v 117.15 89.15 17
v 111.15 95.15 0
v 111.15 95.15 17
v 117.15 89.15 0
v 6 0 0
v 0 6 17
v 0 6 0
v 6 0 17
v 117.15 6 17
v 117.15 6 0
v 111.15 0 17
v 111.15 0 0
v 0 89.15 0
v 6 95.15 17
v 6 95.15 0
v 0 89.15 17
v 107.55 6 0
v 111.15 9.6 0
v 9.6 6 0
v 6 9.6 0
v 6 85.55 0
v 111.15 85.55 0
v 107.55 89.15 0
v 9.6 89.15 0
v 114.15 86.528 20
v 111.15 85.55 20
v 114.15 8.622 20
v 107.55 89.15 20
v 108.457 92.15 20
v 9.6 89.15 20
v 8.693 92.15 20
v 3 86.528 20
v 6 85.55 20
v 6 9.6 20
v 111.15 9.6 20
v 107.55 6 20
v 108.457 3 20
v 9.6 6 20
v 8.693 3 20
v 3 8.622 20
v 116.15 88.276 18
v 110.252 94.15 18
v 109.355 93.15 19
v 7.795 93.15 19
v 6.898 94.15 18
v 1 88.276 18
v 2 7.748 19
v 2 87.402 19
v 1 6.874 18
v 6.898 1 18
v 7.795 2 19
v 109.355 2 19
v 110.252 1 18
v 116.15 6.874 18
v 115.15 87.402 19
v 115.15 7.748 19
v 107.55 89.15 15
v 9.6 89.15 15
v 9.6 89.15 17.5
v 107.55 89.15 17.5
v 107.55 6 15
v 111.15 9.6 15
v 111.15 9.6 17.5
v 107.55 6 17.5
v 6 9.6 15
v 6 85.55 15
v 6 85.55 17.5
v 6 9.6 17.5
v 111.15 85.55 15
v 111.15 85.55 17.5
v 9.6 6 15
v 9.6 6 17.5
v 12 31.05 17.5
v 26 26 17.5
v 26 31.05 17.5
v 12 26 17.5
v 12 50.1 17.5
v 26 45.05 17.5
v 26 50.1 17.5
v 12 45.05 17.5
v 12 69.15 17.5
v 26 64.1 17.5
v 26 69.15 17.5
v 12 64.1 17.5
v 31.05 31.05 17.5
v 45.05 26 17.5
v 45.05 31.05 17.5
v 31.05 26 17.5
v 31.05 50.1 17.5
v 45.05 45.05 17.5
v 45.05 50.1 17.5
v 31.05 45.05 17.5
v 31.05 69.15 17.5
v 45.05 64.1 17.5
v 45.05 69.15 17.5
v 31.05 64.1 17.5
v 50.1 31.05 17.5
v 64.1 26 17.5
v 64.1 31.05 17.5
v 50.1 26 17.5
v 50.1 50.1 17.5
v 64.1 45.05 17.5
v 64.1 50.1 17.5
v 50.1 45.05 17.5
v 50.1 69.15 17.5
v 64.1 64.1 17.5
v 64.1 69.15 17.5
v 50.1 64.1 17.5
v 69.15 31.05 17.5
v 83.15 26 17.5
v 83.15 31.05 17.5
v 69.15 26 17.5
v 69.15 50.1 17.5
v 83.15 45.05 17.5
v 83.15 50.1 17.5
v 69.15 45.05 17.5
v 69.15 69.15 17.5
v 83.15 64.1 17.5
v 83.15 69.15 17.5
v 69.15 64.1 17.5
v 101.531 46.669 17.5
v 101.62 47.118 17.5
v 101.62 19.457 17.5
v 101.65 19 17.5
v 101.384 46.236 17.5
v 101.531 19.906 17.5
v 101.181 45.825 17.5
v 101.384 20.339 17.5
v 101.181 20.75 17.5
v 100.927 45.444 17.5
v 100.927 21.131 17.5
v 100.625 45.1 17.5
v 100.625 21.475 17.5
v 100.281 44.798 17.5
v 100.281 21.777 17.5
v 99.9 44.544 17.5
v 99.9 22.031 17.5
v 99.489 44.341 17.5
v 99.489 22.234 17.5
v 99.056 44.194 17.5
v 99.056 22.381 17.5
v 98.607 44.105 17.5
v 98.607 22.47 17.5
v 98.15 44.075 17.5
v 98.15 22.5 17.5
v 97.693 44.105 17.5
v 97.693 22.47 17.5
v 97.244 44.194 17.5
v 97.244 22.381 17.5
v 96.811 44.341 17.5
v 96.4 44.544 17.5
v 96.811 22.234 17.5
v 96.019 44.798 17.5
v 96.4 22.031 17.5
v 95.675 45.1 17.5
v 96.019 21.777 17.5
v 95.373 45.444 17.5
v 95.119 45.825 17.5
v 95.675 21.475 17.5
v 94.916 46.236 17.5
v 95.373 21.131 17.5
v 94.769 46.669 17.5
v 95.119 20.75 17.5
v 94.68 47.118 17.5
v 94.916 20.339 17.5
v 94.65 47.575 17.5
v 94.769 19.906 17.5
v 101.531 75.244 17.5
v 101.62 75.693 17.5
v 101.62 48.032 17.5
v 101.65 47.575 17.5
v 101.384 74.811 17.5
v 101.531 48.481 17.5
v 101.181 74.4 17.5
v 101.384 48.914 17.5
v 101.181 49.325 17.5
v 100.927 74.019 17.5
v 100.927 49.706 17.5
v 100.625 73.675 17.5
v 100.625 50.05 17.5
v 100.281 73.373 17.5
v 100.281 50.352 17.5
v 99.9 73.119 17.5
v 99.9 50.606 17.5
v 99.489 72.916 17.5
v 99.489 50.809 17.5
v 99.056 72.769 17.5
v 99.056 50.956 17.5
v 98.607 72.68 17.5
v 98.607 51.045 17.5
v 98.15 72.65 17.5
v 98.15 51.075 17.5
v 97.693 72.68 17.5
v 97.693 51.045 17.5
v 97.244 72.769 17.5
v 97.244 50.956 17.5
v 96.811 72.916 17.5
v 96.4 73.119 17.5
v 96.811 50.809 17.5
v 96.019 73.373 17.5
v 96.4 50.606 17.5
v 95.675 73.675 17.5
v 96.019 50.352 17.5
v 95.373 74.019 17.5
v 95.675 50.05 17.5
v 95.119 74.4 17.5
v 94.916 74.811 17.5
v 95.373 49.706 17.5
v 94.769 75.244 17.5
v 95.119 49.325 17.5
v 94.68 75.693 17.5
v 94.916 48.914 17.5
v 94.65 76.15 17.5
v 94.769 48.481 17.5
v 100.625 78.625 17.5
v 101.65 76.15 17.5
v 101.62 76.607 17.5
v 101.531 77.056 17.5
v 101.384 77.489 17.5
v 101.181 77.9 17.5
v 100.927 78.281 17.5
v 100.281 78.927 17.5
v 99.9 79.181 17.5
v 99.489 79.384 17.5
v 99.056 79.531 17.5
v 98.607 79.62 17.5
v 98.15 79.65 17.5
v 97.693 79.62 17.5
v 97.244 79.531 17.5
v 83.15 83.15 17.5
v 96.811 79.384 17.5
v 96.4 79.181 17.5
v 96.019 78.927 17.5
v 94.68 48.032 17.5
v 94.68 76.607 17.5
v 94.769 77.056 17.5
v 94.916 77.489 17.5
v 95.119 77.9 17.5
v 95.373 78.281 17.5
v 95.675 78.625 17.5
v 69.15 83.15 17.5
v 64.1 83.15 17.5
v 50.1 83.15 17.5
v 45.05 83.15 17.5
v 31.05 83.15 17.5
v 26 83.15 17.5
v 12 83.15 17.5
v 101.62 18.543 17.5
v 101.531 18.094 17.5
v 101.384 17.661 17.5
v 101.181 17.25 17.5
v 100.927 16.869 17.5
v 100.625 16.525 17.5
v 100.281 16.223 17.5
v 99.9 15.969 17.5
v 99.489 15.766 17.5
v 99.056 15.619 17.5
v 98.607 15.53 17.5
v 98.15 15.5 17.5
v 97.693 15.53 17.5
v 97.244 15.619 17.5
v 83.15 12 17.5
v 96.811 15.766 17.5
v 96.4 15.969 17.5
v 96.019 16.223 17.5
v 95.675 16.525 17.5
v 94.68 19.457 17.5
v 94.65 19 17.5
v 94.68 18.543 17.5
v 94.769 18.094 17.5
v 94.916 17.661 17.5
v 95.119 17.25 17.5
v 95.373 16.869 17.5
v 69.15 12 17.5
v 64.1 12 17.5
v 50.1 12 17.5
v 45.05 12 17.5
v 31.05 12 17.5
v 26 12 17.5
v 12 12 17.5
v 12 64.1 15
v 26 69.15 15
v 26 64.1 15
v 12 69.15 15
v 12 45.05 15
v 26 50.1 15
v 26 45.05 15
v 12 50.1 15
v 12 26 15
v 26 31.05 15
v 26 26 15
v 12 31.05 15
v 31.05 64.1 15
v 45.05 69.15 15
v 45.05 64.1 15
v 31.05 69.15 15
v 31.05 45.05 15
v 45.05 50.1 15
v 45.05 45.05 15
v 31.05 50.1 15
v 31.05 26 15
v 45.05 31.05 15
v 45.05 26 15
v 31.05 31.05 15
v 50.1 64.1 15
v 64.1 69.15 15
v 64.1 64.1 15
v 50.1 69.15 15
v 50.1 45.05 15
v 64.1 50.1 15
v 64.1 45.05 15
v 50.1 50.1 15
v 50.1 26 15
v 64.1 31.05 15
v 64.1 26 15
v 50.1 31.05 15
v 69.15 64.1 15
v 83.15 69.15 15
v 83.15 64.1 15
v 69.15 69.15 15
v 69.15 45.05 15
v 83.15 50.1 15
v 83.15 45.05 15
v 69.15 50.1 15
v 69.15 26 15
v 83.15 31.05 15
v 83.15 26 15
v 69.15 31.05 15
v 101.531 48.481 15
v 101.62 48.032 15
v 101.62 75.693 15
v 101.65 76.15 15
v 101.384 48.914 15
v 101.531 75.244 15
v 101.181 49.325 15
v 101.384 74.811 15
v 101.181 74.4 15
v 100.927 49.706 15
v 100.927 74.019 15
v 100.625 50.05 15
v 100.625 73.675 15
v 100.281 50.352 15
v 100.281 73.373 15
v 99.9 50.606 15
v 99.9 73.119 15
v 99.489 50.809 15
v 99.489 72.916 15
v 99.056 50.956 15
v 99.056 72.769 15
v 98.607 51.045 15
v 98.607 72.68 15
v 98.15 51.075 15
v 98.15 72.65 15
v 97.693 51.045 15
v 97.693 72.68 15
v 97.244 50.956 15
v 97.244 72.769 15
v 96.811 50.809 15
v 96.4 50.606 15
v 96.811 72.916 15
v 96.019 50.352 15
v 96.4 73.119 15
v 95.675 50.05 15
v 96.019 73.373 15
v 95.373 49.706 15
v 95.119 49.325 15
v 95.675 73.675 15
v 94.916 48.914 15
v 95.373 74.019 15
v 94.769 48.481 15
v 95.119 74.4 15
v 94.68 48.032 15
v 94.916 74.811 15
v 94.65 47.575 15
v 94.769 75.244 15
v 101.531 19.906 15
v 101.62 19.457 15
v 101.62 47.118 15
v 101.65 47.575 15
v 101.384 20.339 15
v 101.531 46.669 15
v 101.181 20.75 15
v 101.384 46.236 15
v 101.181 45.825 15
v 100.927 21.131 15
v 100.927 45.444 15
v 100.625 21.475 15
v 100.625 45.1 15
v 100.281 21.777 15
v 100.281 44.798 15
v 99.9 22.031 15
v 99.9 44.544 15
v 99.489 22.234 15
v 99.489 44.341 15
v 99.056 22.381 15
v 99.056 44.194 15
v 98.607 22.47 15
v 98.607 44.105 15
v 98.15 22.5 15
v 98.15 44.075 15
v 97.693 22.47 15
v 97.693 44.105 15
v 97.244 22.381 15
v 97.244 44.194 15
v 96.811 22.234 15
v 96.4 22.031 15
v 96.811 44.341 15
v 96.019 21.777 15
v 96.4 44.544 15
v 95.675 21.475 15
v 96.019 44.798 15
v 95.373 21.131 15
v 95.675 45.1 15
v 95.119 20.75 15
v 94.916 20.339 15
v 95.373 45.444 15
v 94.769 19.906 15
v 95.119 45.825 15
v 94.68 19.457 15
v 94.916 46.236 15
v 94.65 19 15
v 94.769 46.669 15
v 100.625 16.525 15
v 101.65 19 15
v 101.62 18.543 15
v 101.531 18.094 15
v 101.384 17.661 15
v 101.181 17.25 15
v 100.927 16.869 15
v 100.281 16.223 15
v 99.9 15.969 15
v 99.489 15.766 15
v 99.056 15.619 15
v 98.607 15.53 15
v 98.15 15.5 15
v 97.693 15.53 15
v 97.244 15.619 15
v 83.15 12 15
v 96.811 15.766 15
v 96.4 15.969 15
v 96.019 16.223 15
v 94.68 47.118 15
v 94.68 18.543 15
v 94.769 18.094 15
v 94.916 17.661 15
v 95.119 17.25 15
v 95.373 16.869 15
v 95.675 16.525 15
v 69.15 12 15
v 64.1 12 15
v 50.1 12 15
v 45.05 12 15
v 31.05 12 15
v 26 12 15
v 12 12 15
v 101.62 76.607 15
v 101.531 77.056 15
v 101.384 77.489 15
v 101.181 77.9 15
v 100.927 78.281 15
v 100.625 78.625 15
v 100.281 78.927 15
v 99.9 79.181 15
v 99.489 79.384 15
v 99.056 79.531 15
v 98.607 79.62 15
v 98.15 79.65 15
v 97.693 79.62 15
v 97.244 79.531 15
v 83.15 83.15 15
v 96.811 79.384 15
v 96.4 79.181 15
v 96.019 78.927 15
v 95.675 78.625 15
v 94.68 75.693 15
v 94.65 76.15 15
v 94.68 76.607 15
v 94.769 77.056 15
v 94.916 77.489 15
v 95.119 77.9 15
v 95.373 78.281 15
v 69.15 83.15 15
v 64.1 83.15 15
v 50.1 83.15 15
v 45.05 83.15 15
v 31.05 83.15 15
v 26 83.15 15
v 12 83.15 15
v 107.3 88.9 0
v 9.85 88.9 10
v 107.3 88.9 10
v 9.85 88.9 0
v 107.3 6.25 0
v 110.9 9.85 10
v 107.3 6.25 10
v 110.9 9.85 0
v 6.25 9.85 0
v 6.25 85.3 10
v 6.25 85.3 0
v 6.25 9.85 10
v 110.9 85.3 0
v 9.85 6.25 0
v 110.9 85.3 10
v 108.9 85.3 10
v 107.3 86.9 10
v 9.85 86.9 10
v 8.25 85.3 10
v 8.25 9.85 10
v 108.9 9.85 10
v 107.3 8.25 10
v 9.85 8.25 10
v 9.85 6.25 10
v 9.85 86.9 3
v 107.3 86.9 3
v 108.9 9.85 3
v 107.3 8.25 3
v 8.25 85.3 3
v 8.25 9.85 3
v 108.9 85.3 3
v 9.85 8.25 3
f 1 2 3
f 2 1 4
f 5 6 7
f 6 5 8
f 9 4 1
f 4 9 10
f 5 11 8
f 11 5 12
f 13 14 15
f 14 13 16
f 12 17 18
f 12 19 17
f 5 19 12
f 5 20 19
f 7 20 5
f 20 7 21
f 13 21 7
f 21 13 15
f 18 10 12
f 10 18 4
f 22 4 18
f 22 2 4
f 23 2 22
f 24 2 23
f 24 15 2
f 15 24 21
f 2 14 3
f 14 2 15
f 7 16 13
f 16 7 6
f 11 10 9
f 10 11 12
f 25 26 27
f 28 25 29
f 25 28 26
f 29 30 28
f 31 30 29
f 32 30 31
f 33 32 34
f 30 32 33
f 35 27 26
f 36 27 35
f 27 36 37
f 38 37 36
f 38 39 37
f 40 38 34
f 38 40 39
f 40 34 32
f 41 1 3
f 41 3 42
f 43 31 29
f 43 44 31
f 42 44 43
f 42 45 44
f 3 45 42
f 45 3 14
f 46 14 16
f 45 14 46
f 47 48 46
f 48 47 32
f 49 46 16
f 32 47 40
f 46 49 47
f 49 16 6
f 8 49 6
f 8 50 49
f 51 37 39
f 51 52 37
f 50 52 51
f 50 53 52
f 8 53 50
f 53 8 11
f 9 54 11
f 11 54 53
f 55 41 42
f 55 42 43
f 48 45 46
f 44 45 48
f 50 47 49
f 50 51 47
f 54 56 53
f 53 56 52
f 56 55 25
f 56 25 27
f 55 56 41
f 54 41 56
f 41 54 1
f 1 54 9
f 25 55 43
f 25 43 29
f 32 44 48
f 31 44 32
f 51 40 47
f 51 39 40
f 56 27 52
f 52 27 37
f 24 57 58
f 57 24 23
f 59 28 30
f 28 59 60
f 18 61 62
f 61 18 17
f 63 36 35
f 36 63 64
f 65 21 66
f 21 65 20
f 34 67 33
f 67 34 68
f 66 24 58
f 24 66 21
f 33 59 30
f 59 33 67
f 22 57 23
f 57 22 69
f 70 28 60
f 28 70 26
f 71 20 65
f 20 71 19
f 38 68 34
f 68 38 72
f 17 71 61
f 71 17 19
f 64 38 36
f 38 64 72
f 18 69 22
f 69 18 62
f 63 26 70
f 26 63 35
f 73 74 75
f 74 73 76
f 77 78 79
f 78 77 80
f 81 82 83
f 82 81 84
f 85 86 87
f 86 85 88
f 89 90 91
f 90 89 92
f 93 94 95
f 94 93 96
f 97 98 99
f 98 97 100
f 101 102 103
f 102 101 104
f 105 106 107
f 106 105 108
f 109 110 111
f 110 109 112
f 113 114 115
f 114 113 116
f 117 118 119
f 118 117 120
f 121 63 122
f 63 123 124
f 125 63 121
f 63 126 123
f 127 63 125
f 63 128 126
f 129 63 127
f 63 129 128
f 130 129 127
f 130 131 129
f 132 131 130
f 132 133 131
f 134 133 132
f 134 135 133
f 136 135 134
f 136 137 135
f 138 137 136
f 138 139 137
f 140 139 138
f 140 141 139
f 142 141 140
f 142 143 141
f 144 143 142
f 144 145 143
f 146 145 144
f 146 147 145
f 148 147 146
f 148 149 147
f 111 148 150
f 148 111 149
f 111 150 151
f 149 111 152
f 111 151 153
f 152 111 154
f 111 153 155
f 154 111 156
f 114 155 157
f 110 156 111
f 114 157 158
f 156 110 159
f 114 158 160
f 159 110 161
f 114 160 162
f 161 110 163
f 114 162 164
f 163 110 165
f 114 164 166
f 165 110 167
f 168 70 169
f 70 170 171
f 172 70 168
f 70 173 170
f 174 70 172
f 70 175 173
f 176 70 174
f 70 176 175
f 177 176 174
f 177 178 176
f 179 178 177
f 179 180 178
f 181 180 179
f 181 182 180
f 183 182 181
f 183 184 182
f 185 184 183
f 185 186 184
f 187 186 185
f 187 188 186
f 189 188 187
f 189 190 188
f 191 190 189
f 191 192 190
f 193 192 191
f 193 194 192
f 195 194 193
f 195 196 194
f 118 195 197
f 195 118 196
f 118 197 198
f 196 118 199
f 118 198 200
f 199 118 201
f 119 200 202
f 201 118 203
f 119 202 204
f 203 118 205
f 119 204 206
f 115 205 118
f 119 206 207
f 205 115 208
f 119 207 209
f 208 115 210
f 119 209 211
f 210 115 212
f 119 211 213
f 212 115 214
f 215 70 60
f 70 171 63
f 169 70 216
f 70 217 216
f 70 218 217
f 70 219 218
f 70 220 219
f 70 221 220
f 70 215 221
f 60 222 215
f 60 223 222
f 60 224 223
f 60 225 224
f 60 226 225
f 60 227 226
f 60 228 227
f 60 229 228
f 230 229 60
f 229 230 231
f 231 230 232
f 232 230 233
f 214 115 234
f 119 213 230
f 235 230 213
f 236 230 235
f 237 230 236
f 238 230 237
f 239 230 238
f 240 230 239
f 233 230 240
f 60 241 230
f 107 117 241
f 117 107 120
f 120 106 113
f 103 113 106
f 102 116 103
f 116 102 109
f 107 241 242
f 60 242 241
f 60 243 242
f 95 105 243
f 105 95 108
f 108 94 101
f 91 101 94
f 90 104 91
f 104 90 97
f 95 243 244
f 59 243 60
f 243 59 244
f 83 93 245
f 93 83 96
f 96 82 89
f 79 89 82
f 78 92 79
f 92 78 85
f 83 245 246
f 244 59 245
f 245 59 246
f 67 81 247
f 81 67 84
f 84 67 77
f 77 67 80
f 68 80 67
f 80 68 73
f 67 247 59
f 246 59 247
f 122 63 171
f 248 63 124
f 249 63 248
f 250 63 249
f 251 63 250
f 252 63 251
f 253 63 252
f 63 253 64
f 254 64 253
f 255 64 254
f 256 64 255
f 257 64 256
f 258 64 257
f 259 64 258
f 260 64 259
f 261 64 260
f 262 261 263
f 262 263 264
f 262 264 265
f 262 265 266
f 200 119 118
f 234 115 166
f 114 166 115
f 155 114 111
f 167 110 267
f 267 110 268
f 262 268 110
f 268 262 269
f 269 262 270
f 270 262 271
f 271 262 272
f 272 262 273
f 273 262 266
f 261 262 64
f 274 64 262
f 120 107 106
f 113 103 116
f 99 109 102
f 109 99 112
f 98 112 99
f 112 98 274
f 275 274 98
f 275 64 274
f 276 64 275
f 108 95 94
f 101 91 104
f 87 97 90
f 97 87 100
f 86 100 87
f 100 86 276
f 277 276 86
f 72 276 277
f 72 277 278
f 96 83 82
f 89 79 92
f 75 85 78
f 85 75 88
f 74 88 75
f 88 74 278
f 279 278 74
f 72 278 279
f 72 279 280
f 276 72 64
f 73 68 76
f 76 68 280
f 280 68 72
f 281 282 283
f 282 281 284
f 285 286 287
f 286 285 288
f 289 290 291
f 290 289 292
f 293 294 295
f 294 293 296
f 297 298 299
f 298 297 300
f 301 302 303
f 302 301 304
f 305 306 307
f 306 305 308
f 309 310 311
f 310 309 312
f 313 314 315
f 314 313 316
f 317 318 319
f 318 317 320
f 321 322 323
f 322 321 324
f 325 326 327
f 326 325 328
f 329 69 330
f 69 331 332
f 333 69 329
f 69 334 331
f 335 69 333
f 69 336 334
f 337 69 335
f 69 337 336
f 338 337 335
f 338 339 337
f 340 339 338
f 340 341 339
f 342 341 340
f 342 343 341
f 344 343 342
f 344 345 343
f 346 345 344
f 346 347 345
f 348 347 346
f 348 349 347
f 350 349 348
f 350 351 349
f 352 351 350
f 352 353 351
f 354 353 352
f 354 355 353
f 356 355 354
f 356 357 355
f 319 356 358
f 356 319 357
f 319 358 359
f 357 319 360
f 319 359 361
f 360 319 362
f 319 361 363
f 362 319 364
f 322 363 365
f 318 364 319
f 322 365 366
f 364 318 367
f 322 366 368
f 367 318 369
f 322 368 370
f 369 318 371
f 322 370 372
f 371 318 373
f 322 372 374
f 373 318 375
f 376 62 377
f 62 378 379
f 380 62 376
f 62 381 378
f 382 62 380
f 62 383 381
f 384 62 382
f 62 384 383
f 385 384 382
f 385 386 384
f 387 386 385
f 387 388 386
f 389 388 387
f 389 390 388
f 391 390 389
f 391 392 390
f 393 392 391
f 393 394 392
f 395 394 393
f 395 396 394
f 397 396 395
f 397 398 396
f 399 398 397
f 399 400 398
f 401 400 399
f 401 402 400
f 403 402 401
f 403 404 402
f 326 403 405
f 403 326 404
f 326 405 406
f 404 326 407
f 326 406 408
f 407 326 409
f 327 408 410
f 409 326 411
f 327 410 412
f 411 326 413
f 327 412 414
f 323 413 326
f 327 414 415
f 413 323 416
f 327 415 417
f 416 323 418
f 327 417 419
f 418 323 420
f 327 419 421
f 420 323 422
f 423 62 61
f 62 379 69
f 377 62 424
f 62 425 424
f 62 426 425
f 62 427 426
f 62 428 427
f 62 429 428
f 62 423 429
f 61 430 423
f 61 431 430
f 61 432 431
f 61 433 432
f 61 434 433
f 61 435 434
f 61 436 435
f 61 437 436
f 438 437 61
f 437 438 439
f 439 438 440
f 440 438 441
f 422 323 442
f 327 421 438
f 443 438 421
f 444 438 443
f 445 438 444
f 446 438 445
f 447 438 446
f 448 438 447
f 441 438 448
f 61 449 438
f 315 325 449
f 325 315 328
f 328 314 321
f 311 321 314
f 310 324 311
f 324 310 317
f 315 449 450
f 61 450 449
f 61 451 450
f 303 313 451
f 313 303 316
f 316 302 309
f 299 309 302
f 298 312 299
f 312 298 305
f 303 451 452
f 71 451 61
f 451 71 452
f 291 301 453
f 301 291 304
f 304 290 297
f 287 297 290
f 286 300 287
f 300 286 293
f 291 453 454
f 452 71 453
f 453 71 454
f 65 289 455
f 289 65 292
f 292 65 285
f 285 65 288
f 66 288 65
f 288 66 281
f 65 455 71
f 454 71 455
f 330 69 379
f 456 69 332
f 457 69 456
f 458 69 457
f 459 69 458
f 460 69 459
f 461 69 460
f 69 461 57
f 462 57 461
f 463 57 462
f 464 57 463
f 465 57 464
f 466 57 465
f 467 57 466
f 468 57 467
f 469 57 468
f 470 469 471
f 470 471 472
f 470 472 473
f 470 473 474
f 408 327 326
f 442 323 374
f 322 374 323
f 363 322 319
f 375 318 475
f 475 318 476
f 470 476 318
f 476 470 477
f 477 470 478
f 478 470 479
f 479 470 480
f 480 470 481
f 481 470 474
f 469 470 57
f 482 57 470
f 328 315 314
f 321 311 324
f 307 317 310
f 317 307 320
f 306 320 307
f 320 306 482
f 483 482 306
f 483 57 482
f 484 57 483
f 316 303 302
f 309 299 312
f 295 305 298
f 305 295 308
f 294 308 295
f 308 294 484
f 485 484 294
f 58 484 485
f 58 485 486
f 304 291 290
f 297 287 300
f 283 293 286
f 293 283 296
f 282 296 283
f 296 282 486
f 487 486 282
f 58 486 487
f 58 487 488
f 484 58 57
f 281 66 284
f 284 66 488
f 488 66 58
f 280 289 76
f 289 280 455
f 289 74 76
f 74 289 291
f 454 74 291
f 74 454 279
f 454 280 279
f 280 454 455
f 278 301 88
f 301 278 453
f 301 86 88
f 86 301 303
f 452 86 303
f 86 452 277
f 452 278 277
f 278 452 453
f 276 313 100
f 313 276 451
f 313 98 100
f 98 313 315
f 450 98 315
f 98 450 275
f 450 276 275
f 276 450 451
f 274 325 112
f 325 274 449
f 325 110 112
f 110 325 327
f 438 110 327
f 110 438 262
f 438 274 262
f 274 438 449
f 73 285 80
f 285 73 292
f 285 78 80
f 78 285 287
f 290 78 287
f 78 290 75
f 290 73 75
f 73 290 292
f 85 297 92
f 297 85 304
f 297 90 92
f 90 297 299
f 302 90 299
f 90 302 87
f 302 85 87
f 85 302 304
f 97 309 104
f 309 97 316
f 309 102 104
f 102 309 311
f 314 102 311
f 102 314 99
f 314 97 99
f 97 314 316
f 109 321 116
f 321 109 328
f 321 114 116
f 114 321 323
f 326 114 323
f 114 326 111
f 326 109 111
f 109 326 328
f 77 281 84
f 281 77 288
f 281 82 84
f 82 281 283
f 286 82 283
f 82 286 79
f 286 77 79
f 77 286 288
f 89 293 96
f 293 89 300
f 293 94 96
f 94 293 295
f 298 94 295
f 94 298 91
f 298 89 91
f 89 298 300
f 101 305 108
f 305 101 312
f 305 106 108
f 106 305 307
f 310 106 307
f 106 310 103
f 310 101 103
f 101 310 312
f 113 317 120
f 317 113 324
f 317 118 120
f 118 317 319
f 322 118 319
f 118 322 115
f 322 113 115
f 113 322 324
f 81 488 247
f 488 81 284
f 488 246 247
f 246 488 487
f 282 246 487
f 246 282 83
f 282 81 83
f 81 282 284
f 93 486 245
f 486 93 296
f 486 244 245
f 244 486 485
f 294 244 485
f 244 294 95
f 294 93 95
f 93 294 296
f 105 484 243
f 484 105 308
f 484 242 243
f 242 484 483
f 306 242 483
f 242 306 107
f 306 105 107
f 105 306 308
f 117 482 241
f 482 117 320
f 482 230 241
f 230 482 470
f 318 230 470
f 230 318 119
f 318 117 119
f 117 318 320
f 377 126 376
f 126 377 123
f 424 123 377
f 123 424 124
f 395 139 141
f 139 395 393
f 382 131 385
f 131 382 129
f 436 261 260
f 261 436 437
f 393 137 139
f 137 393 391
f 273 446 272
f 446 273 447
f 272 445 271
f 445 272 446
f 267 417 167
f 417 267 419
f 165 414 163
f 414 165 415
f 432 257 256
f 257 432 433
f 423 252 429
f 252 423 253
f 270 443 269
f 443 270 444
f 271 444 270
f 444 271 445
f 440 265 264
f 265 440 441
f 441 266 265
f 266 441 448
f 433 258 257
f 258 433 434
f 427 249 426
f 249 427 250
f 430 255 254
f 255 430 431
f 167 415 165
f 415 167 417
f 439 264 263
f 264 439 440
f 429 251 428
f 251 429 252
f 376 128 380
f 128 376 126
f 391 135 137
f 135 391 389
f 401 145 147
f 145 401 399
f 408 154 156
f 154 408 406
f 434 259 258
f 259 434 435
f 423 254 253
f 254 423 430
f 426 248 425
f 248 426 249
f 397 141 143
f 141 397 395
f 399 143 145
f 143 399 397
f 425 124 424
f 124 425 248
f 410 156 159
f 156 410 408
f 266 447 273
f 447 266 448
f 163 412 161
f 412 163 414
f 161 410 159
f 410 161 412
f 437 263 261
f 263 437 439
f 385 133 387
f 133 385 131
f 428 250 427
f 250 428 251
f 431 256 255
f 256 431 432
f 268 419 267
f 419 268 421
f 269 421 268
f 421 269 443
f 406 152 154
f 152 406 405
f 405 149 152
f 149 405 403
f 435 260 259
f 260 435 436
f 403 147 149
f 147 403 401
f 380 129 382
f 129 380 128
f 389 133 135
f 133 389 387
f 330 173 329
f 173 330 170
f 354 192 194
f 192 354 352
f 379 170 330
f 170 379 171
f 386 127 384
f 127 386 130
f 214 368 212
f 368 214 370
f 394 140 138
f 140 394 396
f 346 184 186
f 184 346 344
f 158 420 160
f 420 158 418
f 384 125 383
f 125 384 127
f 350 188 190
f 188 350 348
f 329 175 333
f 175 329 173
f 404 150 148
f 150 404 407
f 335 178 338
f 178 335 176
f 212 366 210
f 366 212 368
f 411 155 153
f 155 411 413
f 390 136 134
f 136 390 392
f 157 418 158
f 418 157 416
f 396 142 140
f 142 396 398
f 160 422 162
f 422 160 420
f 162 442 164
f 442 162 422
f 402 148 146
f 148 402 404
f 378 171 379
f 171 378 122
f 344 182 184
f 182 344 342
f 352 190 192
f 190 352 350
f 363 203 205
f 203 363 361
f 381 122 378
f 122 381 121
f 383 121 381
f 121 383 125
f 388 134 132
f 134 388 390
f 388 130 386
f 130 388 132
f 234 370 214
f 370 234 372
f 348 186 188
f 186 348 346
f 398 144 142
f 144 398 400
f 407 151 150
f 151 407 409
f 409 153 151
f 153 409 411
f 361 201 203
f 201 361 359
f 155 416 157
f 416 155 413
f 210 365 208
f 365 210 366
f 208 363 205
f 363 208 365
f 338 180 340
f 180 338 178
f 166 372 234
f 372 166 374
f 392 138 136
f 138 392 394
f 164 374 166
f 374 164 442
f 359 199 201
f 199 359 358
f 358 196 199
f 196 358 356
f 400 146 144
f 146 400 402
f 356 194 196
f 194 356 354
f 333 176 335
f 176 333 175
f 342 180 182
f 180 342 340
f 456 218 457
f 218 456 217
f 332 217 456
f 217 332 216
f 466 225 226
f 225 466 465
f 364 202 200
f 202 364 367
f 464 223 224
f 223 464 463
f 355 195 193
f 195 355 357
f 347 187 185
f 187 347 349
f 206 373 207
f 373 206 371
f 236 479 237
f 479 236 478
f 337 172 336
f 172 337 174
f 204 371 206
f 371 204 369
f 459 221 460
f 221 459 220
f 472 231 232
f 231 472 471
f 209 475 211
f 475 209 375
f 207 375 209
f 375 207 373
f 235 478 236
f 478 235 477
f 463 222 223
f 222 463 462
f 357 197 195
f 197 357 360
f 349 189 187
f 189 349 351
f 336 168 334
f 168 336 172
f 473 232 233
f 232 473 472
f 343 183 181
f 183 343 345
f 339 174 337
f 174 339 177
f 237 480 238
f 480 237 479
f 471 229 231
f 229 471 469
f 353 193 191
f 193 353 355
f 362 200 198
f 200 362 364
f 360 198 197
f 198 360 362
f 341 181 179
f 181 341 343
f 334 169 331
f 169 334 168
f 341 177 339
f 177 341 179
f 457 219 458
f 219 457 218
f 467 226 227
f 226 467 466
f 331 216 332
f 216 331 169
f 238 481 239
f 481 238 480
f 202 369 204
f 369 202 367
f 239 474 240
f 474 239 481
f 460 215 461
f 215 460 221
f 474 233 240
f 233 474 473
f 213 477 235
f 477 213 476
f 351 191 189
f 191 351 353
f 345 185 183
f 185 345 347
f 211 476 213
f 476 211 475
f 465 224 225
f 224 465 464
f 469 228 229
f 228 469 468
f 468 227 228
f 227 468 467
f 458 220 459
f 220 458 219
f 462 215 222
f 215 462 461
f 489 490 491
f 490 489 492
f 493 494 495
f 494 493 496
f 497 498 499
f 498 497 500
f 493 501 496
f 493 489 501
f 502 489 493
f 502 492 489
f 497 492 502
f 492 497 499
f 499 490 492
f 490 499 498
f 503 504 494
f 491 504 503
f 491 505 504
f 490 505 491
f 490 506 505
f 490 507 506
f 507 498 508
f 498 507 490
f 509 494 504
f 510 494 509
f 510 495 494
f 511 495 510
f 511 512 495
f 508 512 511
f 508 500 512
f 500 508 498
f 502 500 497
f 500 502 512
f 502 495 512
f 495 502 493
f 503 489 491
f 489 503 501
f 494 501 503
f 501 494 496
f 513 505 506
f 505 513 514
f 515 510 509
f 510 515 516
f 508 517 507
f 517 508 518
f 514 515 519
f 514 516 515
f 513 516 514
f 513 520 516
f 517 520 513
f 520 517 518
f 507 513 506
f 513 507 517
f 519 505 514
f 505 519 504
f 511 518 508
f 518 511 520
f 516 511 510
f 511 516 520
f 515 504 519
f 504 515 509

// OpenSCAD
// file: case_v4_bottom.scad
// Stream Deck Macro — bottom plate v4 (tray with sliding wall)
// Slides up into the top piece's inner cavity from below. The tray's outer
// wall matches the top's inner hollow, minus a small per-side clearance so
// it can actually slide in once printed.

include <case_params.scad>

fit_clearance    = 0.25; // per-side gap for a sliding fit
floor_thickness  = 3;    // tray floor thickness
wall_thickness   = 2;    // tray's own perimeter wall thickness
wall_height      = 10;   // how tall the tray wall is (slides into the top's cavity)

bottom_w = (plate_w - 2*border) - 2*fit_clearance;
bottom_d = (plate_d - 2*border) - 2*fit_clearance;
bottom_chamfer = corner_chamfer * 0.6;

module case_bottom() {
    translate([border + fit_clearance, border + fit_clearance, 0])
        difference() {
            linear_extrude(height = wall_height)
                chamfered_rect(bottom_w, bottom_d, bottom_chamfer);
            translate([wall_thickness, wall_thickness, floor_thickness])
                linear_extrude(height = wall_height)
                    chamfered_rect(bottom_w - 2*wall_thickness,
                                   bottom_d - 2*wall_thickness,
                                   max(bottom_chamfer - wall_thickness, 0.1));
        }
}

case_bottom();
// file: case_v4_top.scad
// Stream Deck Macro — top plate v4
// Outer shell style inspired by "MisteRdeck / Ocreeb DIY Macro Keypad"
// (printables.com) — fresh parametric geometry: chamfered-corner rim with a
// tapered top edge, and a recessed inner deck (like the original) for the
// switches, hollow underneath for switch body clearance.

include <case_params.scad>

module rim_shell() {
    // straight body
    linear_extrude(height = rim_height - bevel_height)
        chamfered_rect(plate_w, plate_d, corner_chamfer);
    // tapered top collar — centered before scaling so all 4 sides bevel evenly
    translate([plate_w/2, plate_d/2, rim_height - bevel_height])
        linear_extrude(height = bevel_height,
                       scale = [(plate_w - 2*bevel_inset) / plate_w,
                                (plate_d - 2*bevel_inset) / plate_d])
            translate([-plate_w/2, -plate_d/2])
                chamfered_rect(plate_w, plate_d, corner_chamfer);
}

module inner_hollow() {
    // full-depth opening inside the rim border, plus extra above/below to
    // guarantee clean cuts
    translate([border, border, -1])
        linear_extrude(height = rim_height + 2)
            chamfered_rect(plate_w - 2*border, plate_d - 2*border, corner_chamfer * 0.6);
}

module switch_deck() {
    // Slightly larger than the hollow it sits in, overlapping the wall by
    // `overlap` on every side — a flush, knife-edge touch is numerically
    // fragile for CSG union (esp. once one side gets a multmatrix applied
    // to it) and can leave the deck as a disconnected floating volume.
    overlap = 0.5;
    translate([border - overlap, border - overlap, rim_height - deck_recess - deck_thickness])
        linear_extrude(height = deck_thickness)
            chamfered_rect(plate_w - 2*border + 2*overlap, plate_d - 2*border + 2*overlap, corner_chamfer * 0.6);
}

module new_switch_grid(origin_x, origin_y) {
    for (row = [0 : grid_rows - 1])
        for (col = [0 : grid_cols - 1])
            translate([origin_x + col*switch_pitch, origin_y + row*switch_pitch, -2])
                linear_extrude(height = rim_height + 4)
                    square(switch_hole, center = true);
}

module new_encoder_column(origin_x, origin_y, grid_height) {
    spacing = grid_height / (encoder_count - 1);
    for (i = [0 : encoder_count - 1])
        translate([origin_x, origin_y + i*spacing, -2])
            linear_extrude(height = rim_height + 4)
                circle(d = encoder_d, $fn = 48);
}

grid_origin_x = margin + switch_hole/2;
grid_origin_y = margin + switch_hole/2;
grid_height_span = (grid_rows - 1) * switch_pitch;
encoder_x = grid_origin_x + (grid_cols - 1)*switch_pitch + switch_hole/2 + encoder_gap;

module case_top() {
    difference() {
        union() {
            difference() {
                rim_shell();
                inner_hollow();
            }
            switch_deck();
        }
        new_switch_grid(grid_origin_x, grid_origin_y);
        new_encoder_column(encoder_x, grid_origin_y, grid_height_span);
    }
}

// ---- Wedge tilt: flat bottom everywhere, walls + deck grow taller toward
// the back.
tilt_angle_deg = 30;
riser_height = plate_d * tan(tilt_angle_deg);   // ~54.93mm extra height at the back
shear_factor = riser_height / plate_d;
back_height = rim_height + riser_height;
deck_mid_z = rim_height - deck_recess - deck_thickness/2;   // flat-design deck centerline

module wedge_cutter(front_h) {
    // Half-space block whose top face is the plane z = y*shear_factor + front_h
    // — passes through (y=0, z=front_h).
    translate([0, 0, front_h])
        rotate([tilt_angle_deg, 0, 0])
            translate([-1000, -1000, -2000])
                cube([plate_w + 2000, plate_d + 2000, 2000]);
}

module wedge_straight_body() {
    // Front height stays at rim_height - bevel_height (same as the flat
    // design's straight body, below where its tapered collar used to start)
    // so it can never dip low enough to cut into the deck. +0.3 overlap into
    // the collar above, so the two pieces have real shared volume, not just
    // a knife-edge touch.
    intersection() {
        linear_extrude(height = back_height)
            chamfered_rect(plate_w, plate_d, corner_chamfer);
        wedge_cutter(rim_height - bevel_height + 0.3);
    }
}

module wedge_top_collar() {
    // Same tapered-collar shape as the flat design's rim_shell() bevel,
    // sheared by the same slope as everything else so it sits flush on top
    // of wedge_straight_body() at every y — thin (bevel_height=3mm), so the
    // shear reads as a clean taper here, not a stretched parallelogram like
    // it did on the full 20mm+ wall.
    // Uses offset() (a constant inward shrink per edge) instead of the flat
    // design's non-uniform X/Y scale — scaling by different factors in X and
    // Y (since plate_w != plate_d) skews the 45 degree corner chamfer at the
    // top out of alignment with the same chamfer below it, which reads as a
    // disconnected/kinked edge right where the collar meets the body.
    sheared()
    hull() {
        translate([0, 0, rim_height - bevel_height])
            linear_extrude(height = 0.01)
                chamfered_rect(plate_w, plate_d, corner_chamfer);
        translate([0, 0, rim_height])
            linear_extrude(height = 0.01)
                offset(delta = -bevel_inset)
                    chamfered_rect(plate_w, plate_d, corner_chamfer);
    }
}

module wedge_outer_shell() {
    difference() {
        union() {
            wedge_straight_body();
            wedge_top_collar();
        }
        translate([border, border, -1])
            linear_extrude(height = back_height + 2)
                chamfered_rect(plate_w - 2*border, plate_d - 2*border, corner_chamfer * 0.6);
    }
}

module sheared() {
    multmatrix([
        [1, 0, 0, 0],
        [0, 1, 0, 0],
        [0, shear_factor, 1, 0],
        [0, 0, 0, 1]
    ])
    children();
}

module tilted_hole(px, py) {
    // Places children (a vertical, centered hole prism) at (px, py) on the
    // deck's tilted surface, then rotates it in place so its axis is
    // perpendicular to the deck face — matching how a plate-mount switch or
    // encoder actually clips in, instead of punching straight down through a
    // slanted plate at an angle.
    translate([px, py, deck_mid_z + shear_factor * py])
        rotate([tilt_angle_deg, 0, 0])
            children();
}

module tilted_switch_grid(origin_x, origin_y) {
    for (row = [0 : grid_rows - 1])
        for (col = [0 : grid_cols - 1])
            tilted_hole(origin_x + col*switch_pitch, origin_y + row*switch_pitch)
                linear_extrude(height = 20, center = true)
                    square(switch_hole, center = true);
}

module tilted_encoder_column(origin_x, origin_y, grid_height) {
    spacing = grid_height / (encoder_count - 1);
    for (i = [0 : encoder_count - 1])
        tilted_hole(origin_x, origin_y + i*spacing)
            linear_extrude(height = 20, center = true)
                circle(d = encoder_d, $fn = 48);
}

module case_top_tilted() {
    difference() {
        union() {
            wedge_outer_shell();
            sheared() switch_deck();
        }
        tilted_switch_grid(grid_origin_x, grid_origin_y);
        tilted_encoder_column(encoder_x, grid_origin_y, grid_height_span);
    }
}

case_top_tilted();
// file: case_params.scad
// Stream Deck Macro — shared case dimensions (included by top/bottom/assembly)

// ---- Our target layout ----
switch_hole   = 14;
switch_pitch  = 19.05;
grid_cols     = 4;
grid_rows     = 4;
grid_span     = (grid_cols - 1) * switch_pitch + switch_hole; // 71.15

encoder_d     = 7;       // placeholder — confirm with calipers before printing final
encoder_count = 3;
encoder_gap   = 15;

margin = 12;

// ---- Shell style ----
corner_chamfer = 6;    // diagonal cut on each of the 4 corners
rim_height     = 20;   // total wall height (top to bottom), 2cm per feedback
bevel_height   = 3;    // top tapered collar height
bevel_inset    = 3;    // how far the top face is inset from the outer wall
border         = 6;    // rim wall thickness (outer edge to inner hollow)
deck_recess    = 2.5;  // how far below the rim top the switch deck sits
deck_thickness = 2.5;  // thickness of the switch deck floor

plate_w = margin*2 + grid_span + encoder_gap + encoder_d;
plate_d = margin*2 + grid_span;

module chamfered_rect(w, d, c) {
    polygon(points = [
        [c, 0], [w - c, 0],
        [w, c], [w, d - c],
        [w - c, d], [c, d],
        [0, d - c], [0, c]
    ]);
}
// main file
// Fit-check only — both pieces as plain solid geometry.

include <case_params.scad>
use <case_v4_top.scad>
use <case_v4_bottom.scad>

case_top();
case_bottom();
